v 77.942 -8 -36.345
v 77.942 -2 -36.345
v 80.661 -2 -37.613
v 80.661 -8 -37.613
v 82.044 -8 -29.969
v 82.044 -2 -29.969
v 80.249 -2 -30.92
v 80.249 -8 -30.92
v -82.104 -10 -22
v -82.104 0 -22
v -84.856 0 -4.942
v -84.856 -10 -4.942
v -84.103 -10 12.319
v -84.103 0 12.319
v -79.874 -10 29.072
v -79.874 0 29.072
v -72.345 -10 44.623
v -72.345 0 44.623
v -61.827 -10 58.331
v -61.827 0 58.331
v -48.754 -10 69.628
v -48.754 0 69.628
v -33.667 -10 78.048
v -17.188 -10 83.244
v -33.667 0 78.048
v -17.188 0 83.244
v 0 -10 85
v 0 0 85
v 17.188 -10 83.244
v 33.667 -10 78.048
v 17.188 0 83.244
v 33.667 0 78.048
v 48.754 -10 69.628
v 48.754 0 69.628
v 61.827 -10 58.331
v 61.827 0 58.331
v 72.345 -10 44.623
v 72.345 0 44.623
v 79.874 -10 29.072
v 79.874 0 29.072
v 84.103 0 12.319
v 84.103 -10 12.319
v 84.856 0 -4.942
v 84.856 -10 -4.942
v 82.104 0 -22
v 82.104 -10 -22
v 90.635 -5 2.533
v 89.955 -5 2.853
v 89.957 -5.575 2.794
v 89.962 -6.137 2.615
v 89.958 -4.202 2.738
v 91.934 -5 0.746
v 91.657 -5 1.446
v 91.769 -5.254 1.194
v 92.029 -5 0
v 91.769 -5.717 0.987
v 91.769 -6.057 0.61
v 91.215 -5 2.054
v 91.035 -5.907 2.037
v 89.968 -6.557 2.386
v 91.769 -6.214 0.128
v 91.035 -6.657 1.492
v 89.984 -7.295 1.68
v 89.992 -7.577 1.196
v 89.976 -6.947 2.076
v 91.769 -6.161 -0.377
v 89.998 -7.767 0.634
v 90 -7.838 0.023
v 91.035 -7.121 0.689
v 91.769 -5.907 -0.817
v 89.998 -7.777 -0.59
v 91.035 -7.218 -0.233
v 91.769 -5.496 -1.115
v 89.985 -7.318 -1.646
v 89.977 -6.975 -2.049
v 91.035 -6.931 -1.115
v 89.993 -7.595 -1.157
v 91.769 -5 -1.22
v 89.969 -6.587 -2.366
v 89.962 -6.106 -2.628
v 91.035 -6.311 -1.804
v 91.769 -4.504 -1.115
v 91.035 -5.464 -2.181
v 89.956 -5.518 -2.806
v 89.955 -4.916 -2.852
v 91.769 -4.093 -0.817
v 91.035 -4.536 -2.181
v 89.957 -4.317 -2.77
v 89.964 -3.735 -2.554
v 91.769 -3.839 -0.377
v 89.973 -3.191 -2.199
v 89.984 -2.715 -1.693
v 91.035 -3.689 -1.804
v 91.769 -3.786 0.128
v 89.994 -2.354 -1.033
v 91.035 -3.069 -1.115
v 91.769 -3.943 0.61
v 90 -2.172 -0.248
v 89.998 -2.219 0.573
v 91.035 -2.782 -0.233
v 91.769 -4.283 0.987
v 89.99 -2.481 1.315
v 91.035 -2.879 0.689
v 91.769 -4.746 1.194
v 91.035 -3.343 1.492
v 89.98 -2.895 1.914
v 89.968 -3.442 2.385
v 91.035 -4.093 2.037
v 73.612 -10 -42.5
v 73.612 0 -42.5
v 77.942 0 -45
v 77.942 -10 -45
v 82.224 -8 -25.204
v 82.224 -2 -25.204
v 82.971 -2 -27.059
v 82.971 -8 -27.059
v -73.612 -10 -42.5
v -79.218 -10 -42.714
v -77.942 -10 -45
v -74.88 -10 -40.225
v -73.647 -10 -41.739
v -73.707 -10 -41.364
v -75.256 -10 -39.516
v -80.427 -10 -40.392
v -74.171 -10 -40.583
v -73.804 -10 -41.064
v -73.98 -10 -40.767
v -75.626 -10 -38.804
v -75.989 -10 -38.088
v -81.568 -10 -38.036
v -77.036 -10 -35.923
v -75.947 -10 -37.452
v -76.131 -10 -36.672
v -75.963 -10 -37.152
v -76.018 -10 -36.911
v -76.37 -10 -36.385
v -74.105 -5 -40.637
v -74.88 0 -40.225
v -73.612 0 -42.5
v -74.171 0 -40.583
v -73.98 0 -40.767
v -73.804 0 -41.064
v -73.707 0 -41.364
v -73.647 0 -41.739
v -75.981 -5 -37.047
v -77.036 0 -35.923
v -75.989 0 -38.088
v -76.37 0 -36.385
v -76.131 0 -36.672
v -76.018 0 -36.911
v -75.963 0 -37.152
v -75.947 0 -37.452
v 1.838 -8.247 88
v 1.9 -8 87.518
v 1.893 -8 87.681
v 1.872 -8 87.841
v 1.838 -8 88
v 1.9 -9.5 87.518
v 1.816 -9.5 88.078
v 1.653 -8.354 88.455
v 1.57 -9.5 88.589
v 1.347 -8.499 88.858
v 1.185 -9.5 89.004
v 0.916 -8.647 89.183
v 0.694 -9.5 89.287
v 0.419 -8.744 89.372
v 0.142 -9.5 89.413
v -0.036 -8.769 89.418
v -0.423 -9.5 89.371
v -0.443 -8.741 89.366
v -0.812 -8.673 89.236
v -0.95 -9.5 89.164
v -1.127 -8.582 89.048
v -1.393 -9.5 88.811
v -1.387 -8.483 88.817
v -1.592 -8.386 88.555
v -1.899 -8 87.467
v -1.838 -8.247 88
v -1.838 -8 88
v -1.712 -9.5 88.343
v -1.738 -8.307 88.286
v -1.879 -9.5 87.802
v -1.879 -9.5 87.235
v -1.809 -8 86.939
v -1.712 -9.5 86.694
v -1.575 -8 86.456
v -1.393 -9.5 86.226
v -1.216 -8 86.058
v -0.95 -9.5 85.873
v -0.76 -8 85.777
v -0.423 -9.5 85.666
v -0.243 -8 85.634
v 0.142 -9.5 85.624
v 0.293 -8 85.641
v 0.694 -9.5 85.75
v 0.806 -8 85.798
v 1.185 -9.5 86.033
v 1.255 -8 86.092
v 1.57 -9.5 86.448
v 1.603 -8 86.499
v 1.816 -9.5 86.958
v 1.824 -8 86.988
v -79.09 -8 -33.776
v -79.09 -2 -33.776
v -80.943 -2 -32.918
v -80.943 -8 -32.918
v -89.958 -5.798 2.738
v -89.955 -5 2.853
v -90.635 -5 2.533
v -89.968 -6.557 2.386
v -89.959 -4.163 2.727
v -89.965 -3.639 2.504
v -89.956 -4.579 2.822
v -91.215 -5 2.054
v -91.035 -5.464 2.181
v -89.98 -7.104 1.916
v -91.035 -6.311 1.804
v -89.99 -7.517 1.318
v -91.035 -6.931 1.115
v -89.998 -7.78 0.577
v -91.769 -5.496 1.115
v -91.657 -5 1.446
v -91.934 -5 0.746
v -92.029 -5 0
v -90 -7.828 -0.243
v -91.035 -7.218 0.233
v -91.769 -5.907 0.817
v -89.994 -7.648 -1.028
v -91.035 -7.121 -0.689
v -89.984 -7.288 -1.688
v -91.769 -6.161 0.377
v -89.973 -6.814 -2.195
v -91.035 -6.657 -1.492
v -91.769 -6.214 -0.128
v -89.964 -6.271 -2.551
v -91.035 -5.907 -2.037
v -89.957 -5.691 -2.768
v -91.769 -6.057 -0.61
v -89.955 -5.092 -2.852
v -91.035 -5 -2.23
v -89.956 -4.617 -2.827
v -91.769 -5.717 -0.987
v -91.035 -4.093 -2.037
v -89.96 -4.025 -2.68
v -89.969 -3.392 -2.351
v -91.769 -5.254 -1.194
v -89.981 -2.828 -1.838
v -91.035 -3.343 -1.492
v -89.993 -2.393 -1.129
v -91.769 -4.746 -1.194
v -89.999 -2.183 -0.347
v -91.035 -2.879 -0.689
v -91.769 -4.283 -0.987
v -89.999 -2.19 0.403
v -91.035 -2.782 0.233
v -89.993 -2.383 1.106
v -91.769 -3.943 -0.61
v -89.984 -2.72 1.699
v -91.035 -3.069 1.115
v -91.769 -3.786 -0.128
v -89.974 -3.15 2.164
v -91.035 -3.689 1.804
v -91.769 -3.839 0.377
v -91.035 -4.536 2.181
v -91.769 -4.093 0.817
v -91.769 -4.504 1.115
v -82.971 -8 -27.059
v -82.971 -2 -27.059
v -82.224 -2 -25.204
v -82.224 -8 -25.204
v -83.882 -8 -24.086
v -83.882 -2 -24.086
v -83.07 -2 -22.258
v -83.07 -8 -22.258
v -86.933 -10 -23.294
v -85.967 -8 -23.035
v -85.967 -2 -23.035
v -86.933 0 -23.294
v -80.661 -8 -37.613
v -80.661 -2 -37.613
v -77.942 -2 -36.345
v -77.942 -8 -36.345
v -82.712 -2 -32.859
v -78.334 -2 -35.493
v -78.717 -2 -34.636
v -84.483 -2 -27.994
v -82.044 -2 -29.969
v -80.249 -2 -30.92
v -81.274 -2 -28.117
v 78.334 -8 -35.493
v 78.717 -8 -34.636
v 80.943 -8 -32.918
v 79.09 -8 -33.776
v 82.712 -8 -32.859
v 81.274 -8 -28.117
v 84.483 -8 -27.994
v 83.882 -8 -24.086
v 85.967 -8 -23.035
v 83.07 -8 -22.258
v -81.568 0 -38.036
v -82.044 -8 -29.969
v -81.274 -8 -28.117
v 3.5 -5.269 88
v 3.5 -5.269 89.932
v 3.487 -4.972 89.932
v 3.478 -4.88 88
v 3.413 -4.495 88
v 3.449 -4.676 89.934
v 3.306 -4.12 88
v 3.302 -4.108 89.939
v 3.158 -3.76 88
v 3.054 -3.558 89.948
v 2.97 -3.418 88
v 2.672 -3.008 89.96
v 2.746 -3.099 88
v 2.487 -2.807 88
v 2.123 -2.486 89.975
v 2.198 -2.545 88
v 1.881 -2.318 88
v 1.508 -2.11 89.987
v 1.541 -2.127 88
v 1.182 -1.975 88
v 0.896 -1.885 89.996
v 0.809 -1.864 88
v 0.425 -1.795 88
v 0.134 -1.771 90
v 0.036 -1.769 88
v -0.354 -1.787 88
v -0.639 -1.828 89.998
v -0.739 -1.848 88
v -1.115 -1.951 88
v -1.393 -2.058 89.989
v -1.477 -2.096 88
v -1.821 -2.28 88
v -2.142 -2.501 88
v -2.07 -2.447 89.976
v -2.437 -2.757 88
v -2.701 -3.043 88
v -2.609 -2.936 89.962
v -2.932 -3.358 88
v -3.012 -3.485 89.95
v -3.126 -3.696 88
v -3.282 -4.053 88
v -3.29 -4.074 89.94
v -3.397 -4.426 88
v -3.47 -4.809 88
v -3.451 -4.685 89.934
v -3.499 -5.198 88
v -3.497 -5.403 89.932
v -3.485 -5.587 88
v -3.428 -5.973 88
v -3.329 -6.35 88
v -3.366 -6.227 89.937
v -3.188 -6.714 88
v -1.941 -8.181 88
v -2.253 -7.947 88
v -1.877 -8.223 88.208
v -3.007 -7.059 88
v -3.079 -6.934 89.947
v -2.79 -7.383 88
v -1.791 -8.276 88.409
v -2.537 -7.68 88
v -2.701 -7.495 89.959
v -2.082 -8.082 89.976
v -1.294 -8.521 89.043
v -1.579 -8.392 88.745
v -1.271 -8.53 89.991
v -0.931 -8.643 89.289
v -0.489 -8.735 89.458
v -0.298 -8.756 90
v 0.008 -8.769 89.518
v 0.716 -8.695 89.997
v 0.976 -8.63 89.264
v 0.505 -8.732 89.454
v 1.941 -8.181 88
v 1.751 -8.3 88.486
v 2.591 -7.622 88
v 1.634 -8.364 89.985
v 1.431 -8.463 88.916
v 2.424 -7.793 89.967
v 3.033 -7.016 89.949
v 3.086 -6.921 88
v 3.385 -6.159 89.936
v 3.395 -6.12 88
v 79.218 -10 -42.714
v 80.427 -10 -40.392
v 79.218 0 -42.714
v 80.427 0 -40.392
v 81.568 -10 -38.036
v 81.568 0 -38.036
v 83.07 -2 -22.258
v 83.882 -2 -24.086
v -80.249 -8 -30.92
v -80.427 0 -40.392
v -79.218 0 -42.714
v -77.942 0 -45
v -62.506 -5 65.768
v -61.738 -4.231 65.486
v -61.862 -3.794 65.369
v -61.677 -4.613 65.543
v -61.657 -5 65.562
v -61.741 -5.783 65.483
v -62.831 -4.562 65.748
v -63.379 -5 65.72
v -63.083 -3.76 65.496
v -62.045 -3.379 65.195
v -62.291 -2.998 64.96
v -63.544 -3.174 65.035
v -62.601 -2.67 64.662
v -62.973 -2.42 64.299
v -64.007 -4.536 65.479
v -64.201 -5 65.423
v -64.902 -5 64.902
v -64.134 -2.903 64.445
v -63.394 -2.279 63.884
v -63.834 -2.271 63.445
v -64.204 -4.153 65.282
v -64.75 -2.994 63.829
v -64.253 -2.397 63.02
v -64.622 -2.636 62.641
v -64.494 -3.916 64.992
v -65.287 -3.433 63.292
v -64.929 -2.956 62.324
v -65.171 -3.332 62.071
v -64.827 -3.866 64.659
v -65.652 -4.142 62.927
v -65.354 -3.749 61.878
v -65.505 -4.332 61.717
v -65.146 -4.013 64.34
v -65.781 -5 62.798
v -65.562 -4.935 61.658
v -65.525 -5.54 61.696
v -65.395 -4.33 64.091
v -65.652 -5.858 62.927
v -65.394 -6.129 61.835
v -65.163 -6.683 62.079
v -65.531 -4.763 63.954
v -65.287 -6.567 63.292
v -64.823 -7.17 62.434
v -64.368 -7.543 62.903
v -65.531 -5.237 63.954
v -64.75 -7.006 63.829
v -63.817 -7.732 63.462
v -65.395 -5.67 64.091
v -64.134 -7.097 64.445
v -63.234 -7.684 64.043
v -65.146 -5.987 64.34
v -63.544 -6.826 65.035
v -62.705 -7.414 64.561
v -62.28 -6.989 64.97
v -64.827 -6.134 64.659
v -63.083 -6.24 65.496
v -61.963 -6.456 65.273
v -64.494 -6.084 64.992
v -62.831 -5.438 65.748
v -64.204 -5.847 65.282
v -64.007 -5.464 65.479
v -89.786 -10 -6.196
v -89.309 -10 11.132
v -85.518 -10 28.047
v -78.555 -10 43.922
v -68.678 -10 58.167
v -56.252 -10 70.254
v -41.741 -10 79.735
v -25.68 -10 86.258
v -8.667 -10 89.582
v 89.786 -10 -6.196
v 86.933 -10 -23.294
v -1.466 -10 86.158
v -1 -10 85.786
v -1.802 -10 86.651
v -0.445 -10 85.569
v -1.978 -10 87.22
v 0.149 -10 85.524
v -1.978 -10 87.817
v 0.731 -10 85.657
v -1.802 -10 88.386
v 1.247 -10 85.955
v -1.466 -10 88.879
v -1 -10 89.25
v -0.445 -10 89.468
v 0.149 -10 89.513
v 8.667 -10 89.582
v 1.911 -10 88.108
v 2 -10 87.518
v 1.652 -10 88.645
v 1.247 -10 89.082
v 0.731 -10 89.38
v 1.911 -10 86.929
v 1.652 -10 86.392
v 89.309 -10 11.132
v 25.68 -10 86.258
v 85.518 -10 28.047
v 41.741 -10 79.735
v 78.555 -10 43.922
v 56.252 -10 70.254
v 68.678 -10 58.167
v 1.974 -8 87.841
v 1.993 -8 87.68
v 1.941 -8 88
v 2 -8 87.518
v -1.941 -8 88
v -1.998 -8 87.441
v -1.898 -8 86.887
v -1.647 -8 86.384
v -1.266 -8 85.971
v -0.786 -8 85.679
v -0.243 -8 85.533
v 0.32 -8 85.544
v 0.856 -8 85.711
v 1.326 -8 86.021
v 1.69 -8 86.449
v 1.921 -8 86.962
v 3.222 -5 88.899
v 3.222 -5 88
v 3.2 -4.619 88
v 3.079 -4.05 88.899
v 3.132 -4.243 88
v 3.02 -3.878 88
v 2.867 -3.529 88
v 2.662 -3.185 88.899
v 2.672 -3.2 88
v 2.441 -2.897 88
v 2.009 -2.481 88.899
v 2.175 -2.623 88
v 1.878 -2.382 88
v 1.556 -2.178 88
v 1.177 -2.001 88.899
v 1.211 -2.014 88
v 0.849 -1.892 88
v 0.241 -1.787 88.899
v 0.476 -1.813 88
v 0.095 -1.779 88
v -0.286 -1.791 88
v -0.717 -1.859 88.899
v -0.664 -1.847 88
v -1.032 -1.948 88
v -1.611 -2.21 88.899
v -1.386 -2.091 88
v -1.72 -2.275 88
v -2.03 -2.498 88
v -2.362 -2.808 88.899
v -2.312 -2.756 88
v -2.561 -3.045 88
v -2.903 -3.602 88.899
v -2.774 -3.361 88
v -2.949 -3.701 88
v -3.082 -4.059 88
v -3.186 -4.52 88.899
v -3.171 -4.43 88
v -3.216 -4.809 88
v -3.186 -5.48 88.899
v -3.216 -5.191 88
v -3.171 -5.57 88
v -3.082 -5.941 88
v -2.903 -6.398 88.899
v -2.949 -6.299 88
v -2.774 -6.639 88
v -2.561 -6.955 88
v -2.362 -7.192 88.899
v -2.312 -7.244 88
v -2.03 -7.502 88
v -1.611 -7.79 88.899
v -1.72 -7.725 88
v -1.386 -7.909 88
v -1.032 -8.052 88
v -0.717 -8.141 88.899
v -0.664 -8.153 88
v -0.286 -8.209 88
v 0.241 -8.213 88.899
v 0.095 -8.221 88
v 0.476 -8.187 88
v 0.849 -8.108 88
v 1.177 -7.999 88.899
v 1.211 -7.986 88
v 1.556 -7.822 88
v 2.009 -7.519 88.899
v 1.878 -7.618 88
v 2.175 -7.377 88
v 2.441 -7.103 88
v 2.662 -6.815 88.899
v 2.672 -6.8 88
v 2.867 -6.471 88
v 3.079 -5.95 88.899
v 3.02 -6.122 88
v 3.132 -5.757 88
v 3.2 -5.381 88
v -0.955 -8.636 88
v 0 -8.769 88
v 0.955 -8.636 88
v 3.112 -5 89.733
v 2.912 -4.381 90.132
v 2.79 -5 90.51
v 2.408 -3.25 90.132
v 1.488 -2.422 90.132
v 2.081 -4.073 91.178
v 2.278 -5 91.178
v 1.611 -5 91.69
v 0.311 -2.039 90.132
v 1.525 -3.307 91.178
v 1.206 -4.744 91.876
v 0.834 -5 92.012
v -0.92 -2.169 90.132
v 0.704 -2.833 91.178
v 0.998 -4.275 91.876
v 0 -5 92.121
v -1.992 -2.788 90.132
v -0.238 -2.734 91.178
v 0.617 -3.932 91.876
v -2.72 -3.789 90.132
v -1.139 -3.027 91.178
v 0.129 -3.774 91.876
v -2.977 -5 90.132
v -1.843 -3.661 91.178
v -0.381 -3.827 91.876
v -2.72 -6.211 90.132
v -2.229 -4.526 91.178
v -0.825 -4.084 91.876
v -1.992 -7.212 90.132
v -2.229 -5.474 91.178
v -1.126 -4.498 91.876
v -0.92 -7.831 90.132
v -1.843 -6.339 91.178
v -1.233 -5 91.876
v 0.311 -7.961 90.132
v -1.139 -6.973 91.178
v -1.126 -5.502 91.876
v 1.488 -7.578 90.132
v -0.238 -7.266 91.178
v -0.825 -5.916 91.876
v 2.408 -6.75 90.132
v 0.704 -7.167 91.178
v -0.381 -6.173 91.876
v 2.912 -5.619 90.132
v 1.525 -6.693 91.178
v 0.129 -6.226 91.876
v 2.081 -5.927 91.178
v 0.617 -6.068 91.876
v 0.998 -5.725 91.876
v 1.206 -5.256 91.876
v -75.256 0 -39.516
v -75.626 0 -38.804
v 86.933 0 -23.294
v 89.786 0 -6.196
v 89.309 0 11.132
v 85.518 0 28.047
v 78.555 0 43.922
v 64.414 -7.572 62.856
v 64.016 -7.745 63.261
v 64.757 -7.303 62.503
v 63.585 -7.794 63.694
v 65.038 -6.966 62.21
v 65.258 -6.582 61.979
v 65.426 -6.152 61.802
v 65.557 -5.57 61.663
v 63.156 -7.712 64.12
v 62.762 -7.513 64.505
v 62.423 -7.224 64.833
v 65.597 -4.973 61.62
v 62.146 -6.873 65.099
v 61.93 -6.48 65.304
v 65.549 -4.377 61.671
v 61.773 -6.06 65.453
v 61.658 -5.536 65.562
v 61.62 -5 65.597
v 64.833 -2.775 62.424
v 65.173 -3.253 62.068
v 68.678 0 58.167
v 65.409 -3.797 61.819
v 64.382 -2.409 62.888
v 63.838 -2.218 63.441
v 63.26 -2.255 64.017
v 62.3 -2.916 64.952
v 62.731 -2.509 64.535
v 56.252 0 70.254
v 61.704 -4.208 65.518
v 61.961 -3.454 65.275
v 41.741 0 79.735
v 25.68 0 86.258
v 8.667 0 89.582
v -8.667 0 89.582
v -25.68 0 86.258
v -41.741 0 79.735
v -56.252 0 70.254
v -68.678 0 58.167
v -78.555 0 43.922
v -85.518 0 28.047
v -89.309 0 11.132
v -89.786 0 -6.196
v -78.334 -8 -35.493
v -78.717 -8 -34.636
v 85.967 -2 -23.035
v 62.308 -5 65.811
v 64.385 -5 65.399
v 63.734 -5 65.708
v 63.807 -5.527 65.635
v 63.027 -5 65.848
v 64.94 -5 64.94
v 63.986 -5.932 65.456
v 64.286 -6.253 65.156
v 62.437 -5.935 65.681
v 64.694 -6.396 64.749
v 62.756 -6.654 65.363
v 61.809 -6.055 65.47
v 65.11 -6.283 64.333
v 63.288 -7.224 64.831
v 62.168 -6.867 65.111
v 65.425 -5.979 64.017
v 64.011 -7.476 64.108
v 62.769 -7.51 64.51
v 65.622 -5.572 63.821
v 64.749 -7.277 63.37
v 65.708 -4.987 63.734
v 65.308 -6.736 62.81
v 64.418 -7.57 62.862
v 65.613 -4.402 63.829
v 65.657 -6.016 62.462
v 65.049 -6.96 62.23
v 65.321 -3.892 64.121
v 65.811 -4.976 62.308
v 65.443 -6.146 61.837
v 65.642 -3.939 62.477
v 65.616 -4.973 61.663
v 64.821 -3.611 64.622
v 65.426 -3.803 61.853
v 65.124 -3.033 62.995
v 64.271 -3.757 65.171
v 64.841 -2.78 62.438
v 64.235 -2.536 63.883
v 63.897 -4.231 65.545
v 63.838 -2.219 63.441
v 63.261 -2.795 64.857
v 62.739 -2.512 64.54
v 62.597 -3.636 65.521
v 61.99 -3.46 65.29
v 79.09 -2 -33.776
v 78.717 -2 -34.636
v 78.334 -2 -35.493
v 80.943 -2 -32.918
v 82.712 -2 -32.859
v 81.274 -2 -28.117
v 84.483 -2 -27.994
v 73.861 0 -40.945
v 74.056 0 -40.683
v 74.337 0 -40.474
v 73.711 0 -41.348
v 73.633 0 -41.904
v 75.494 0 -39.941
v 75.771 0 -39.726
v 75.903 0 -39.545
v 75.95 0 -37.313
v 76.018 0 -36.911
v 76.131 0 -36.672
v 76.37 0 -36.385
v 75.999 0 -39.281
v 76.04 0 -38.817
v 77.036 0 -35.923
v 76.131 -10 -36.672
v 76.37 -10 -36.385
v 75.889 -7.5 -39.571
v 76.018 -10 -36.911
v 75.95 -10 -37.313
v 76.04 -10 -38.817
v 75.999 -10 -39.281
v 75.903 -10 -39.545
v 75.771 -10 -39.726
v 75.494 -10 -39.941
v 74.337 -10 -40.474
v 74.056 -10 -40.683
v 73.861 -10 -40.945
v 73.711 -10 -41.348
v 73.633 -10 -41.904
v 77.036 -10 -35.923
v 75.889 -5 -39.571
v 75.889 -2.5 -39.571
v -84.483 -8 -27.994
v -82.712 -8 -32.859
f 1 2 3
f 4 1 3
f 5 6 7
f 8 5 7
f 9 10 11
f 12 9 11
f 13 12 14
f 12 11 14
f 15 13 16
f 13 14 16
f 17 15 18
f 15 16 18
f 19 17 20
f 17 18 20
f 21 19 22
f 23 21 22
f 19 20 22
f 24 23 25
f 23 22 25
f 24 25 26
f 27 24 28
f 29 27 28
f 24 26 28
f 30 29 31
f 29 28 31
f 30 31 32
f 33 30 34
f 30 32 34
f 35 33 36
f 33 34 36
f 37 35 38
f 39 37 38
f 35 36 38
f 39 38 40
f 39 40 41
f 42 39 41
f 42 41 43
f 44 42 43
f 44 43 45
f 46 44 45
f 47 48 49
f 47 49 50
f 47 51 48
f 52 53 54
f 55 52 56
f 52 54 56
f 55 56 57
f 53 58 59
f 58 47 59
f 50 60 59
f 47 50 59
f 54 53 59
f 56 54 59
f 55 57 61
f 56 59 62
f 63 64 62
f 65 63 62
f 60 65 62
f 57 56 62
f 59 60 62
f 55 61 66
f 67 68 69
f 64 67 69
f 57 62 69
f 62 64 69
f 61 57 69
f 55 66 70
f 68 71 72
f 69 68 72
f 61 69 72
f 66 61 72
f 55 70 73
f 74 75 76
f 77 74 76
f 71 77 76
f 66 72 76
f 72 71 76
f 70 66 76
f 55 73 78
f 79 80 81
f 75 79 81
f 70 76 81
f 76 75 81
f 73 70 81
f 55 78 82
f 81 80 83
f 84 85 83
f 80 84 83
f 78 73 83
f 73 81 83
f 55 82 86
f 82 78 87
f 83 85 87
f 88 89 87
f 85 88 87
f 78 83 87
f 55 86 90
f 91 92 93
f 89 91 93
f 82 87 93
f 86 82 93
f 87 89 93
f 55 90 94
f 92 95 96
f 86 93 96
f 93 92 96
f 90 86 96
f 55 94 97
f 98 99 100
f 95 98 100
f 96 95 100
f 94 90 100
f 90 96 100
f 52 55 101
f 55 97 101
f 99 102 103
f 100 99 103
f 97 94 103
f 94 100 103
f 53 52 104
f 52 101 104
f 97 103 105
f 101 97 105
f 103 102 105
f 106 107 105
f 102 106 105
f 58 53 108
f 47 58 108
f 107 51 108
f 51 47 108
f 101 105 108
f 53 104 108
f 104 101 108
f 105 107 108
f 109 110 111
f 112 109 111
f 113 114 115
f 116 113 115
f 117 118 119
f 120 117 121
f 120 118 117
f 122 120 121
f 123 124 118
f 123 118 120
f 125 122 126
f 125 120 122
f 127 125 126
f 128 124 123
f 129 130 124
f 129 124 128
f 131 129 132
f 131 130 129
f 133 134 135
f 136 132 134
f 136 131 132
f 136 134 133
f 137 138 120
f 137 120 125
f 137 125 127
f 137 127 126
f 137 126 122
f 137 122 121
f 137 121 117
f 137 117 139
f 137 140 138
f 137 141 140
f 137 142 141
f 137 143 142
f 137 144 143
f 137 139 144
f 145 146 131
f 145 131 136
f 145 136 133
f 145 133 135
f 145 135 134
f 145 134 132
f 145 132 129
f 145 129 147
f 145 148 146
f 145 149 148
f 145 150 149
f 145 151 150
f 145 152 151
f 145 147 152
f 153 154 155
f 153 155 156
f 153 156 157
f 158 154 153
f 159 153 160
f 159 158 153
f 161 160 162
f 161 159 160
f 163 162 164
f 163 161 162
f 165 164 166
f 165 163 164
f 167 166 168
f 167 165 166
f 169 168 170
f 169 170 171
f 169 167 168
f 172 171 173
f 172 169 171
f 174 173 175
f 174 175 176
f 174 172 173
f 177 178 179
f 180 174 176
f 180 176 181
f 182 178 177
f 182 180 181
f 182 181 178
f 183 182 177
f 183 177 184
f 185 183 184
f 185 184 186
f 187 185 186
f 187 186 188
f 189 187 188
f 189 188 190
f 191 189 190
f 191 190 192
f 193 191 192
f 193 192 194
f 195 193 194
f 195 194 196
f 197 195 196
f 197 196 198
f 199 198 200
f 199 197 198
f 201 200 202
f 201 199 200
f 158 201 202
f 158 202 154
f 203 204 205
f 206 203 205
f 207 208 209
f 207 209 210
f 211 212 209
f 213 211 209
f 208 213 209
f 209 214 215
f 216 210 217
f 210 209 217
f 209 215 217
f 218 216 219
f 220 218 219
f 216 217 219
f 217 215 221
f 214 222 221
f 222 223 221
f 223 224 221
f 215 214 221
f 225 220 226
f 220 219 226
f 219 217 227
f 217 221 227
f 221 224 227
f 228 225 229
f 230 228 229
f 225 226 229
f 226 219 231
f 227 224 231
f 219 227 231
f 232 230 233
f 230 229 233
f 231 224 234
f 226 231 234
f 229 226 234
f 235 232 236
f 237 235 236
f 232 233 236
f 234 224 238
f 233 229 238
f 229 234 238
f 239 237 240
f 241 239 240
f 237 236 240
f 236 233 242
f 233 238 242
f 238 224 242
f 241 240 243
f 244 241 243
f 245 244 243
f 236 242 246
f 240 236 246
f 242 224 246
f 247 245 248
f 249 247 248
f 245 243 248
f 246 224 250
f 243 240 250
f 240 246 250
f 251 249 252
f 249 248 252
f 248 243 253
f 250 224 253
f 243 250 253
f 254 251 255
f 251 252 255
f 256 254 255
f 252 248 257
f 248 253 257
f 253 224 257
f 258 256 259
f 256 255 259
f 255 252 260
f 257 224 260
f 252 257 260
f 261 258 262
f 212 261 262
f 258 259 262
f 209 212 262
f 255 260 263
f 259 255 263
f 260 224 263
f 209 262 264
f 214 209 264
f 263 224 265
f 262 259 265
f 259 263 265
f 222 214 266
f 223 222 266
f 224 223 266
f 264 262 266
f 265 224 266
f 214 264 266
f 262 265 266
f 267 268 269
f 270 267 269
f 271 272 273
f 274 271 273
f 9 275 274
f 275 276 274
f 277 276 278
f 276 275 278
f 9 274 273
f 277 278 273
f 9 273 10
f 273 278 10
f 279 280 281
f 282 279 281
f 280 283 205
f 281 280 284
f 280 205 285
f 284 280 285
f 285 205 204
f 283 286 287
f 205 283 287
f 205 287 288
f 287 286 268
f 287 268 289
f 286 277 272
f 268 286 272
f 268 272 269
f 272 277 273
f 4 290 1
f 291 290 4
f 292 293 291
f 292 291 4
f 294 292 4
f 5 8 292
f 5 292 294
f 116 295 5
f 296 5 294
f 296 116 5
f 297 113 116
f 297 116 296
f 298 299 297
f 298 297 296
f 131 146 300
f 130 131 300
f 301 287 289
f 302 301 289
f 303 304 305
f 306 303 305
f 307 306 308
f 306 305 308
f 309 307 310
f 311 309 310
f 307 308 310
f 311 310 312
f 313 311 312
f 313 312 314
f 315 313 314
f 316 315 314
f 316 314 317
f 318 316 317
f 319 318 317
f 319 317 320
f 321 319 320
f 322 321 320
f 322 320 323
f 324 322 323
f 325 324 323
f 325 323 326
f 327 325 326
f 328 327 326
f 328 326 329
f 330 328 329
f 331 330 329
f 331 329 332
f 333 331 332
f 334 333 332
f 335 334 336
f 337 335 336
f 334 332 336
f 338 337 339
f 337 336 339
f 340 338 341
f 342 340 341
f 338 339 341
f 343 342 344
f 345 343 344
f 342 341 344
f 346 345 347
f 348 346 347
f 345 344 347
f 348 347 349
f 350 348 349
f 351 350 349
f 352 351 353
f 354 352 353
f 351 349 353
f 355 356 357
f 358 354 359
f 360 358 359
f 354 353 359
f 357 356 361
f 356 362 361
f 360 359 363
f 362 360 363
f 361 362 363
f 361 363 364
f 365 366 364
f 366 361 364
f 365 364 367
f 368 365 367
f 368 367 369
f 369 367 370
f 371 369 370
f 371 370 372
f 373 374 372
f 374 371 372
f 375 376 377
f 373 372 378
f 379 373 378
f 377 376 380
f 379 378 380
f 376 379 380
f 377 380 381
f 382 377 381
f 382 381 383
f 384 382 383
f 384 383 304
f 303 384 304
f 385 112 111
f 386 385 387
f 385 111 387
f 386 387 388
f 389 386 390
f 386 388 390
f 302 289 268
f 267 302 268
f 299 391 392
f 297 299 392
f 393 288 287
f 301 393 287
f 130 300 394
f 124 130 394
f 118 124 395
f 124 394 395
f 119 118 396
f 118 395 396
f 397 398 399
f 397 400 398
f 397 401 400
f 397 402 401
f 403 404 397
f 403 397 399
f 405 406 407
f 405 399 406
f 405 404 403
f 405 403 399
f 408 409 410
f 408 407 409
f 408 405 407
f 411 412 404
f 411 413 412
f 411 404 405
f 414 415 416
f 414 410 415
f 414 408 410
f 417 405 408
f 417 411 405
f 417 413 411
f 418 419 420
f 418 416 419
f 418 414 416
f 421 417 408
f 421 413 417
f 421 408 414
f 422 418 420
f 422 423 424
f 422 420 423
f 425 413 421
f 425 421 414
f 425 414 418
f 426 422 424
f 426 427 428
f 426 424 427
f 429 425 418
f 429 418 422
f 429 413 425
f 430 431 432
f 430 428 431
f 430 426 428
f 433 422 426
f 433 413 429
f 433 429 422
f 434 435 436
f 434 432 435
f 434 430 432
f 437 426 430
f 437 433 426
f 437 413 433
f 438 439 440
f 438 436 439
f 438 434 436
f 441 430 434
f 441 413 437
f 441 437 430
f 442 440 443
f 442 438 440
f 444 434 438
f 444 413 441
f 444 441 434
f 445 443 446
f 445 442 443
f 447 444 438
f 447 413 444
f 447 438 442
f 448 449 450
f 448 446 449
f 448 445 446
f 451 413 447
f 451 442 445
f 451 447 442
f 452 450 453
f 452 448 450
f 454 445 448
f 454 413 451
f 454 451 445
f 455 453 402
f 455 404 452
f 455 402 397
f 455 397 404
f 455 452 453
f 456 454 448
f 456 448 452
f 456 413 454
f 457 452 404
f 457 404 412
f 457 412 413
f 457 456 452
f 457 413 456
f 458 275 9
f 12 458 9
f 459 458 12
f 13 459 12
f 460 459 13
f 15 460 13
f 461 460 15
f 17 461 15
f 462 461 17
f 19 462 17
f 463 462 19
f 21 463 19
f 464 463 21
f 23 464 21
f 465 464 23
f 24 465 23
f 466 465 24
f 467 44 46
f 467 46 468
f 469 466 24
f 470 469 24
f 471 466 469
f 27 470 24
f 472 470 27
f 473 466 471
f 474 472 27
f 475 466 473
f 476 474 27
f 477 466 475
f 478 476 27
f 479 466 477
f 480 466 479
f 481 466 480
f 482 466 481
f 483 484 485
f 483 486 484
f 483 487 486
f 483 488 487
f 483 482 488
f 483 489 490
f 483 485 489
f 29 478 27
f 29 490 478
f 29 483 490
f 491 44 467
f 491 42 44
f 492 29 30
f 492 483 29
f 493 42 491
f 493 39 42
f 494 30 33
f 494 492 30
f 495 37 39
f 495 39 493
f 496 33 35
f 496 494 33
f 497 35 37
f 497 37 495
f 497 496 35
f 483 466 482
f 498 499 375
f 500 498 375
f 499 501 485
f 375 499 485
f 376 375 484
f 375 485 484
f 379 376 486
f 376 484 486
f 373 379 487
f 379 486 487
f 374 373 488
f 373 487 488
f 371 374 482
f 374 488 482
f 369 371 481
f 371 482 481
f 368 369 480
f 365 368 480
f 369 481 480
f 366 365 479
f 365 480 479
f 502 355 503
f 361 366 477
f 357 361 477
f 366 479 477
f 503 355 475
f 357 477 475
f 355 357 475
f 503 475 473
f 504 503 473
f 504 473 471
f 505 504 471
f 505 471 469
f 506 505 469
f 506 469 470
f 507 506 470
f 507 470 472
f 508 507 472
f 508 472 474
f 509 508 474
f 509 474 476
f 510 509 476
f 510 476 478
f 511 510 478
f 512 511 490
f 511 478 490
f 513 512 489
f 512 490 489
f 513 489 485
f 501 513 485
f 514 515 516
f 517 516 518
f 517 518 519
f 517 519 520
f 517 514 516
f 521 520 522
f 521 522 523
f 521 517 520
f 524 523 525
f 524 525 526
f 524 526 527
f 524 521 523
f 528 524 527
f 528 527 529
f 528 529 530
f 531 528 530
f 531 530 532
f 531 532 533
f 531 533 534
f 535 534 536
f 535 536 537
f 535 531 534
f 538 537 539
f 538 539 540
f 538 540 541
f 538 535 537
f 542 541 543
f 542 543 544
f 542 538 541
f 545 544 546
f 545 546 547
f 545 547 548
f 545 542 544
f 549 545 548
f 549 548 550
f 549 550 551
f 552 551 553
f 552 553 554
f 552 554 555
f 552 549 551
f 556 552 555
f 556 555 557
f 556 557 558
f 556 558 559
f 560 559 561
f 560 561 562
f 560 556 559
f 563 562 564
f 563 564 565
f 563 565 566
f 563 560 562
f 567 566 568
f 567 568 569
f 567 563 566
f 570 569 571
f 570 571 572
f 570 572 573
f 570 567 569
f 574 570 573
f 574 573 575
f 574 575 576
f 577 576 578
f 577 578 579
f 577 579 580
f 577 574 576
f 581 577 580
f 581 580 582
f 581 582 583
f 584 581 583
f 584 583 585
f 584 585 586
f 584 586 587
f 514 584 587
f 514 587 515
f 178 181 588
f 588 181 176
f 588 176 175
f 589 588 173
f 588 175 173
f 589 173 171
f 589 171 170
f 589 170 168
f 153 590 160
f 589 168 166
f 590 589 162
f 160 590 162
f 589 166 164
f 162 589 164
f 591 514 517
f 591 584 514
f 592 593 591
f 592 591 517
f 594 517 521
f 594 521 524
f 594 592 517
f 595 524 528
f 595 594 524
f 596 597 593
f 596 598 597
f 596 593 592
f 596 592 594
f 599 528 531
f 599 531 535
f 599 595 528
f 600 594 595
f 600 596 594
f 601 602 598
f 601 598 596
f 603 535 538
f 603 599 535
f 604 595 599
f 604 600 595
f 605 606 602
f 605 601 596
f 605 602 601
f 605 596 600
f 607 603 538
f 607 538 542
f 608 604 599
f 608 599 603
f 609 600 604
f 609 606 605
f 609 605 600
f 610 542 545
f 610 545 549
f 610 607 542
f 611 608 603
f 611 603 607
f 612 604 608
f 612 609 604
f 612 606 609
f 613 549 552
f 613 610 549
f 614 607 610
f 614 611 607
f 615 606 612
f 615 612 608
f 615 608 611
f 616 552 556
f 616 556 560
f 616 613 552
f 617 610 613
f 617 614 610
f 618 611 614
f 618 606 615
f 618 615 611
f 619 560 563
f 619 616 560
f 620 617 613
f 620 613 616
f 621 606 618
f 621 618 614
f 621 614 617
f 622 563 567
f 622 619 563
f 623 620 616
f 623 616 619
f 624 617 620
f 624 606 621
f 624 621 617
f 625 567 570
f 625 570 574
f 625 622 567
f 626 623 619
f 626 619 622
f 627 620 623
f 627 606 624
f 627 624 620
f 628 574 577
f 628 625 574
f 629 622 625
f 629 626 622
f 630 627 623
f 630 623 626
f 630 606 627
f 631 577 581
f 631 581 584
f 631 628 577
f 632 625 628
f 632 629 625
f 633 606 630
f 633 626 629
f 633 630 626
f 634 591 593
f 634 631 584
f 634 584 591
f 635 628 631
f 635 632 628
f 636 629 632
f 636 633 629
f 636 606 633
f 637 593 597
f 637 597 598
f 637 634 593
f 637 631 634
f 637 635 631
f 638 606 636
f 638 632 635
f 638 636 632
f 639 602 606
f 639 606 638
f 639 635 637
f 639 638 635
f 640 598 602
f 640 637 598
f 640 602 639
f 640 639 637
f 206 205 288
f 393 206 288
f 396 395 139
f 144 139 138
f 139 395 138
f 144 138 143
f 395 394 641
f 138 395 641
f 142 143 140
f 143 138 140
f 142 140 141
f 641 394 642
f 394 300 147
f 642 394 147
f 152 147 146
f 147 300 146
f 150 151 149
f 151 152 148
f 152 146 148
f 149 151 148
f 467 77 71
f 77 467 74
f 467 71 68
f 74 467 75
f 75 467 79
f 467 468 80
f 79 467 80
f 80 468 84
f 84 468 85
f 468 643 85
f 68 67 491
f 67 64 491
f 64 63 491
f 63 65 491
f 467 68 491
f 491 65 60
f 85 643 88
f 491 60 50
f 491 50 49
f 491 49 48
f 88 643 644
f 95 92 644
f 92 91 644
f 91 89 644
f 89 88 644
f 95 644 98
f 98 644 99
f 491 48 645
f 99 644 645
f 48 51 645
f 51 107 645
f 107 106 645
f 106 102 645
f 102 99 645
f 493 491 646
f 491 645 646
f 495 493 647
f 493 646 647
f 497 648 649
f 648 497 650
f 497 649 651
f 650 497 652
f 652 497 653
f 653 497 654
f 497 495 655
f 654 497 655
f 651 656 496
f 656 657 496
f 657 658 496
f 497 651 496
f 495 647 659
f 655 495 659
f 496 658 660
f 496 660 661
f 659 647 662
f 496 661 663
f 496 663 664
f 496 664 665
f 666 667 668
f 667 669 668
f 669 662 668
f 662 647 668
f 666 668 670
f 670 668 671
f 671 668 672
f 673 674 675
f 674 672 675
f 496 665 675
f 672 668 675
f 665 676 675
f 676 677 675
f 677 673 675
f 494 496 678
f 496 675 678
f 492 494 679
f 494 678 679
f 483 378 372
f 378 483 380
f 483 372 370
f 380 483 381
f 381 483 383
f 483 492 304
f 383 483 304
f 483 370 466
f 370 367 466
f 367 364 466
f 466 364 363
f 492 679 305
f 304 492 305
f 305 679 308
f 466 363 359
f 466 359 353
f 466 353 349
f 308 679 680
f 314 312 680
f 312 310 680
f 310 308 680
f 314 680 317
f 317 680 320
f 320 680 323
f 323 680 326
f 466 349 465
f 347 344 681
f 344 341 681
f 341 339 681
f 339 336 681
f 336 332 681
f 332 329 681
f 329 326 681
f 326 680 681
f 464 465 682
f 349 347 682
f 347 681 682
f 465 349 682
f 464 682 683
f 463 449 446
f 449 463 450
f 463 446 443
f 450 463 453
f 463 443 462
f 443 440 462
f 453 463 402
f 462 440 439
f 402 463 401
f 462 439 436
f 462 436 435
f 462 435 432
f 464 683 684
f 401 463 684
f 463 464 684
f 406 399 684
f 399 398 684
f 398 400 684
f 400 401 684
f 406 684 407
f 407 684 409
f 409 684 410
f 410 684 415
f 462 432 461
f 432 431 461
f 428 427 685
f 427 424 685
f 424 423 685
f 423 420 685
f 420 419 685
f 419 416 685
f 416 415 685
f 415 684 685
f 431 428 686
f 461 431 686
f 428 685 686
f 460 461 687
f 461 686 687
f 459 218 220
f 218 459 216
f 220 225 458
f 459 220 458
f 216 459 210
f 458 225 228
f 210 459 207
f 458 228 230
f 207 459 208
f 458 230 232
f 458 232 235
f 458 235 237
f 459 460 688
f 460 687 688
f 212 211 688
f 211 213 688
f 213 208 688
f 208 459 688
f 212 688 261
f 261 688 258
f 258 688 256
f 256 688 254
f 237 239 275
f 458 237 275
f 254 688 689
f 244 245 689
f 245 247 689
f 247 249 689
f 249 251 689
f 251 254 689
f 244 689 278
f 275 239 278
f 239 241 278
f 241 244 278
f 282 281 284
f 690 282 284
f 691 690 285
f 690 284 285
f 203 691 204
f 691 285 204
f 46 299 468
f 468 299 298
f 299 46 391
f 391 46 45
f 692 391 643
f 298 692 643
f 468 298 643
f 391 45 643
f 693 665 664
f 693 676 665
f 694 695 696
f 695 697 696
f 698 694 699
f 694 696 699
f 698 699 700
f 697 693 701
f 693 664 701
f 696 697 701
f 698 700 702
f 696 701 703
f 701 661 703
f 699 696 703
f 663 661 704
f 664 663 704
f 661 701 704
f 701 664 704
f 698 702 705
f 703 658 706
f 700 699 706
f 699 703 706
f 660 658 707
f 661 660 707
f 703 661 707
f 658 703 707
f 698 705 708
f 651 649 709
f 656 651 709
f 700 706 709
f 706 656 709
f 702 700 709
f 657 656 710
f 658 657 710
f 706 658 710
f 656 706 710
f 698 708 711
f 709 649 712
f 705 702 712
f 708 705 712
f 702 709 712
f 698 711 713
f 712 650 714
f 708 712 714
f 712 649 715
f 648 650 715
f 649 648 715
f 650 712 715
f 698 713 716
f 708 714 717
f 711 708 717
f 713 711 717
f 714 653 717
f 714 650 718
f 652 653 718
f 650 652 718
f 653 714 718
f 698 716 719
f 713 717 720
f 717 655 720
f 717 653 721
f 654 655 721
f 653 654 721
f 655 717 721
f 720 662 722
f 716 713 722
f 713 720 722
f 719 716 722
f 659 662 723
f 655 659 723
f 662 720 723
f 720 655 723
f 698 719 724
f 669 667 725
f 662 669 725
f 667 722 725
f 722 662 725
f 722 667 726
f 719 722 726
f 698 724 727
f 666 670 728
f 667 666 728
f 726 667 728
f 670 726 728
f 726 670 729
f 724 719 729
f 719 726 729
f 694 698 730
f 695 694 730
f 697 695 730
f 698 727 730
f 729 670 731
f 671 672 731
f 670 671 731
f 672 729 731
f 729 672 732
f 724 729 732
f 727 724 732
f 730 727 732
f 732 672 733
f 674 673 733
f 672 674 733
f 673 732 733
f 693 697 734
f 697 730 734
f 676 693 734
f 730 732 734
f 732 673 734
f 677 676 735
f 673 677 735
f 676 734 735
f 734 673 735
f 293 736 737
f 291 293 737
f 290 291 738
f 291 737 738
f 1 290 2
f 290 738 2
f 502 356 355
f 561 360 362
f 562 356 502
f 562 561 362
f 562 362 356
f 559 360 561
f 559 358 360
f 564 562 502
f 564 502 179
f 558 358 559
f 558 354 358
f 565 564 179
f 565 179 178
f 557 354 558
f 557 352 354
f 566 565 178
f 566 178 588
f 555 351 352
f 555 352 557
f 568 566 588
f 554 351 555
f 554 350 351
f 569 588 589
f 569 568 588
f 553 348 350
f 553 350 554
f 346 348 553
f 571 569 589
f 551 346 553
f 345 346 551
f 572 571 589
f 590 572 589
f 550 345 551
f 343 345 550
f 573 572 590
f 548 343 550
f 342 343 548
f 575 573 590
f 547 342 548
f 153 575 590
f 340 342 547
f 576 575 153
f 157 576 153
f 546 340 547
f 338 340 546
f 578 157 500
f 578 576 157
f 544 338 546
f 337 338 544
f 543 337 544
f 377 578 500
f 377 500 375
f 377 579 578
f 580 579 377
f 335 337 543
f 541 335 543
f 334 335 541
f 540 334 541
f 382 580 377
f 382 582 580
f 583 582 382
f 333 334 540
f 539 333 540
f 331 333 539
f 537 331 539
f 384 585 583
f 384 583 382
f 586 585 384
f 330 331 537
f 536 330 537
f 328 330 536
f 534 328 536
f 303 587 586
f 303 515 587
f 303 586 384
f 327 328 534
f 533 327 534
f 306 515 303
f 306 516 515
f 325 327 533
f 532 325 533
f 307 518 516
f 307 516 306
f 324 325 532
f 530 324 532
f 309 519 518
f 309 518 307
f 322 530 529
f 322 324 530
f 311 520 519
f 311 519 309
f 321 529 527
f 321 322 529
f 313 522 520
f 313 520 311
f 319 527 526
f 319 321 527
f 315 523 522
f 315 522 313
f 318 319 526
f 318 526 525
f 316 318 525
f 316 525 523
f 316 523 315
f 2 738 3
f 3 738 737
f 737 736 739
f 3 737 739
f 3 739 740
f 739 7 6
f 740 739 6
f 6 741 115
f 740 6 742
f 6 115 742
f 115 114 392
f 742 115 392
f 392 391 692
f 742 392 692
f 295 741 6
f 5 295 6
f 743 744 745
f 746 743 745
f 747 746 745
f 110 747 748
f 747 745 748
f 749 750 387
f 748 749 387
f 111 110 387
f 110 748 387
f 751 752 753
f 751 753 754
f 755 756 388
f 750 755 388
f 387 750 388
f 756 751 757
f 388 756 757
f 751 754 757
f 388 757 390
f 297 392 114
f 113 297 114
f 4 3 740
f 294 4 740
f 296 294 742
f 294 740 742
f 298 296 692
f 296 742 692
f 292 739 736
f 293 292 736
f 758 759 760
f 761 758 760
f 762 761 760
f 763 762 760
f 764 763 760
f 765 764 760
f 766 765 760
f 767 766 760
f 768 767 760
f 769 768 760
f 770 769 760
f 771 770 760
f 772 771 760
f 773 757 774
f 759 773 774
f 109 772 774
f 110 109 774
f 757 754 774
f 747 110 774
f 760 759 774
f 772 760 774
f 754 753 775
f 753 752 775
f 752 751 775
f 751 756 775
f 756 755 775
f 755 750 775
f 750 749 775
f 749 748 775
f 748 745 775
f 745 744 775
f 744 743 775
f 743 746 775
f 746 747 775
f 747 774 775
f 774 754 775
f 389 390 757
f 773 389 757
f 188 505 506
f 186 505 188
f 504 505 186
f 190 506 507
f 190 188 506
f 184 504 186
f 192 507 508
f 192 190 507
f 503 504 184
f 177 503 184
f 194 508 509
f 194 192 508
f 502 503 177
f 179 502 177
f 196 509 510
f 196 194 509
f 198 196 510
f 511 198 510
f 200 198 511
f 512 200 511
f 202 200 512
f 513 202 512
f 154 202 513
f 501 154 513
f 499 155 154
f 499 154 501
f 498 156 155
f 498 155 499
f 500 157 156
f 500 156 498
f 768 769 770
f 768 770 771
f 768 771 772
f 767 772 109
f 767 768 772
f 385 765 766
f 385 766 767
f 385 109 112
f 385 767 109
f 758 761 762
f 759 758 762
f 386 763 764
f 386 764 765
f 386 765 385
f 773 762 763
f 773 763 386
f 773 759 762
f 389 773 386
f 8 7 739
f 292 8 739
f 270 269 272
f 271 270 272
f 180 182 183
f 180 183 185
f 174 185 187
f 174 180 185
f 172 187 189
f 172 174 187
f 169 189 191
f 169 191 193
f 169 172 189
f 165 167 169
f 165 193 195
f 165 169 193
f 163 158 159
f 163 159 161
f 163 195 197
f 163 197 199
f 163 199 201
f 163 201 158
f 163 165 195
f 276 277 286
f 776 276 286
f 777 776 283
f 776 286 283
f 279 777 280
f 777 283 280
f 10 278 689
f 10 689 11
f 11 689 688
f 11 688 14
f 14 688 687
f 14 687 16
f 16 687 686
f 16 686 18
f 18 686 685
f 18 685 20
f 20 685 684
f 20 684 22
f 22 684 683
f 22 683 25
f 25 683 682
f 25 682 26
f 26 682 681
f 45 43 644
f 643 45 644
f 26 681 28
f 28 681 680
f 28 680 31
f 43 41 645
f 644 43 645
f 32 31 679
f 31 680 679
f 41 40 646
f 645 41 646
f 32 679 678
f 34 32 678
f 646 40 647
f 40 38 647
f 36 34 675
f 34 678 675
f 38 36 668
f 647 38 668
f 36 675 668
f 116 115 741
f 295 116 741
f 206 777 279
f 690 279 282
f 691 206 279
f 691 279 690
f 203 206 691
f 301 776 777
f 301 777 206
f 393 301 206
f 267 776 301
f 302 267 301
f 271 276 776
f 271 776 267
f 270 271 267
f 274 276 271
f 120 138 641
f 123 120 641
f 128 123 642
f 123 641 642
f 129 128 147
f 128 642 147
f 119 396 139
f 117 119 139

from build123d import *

# Parameters (mm, degrees)
F1_DEPTH  = 10
F4_DEPTH  = 6
F6_DEPTH  = 10
F7_R      = 2
F7_R_2    = 1.9
F8_DEPTH  = 2
F10_R     = 3.5
F11_DEPTH = 2
F21_R     = 1.9
F22_DEPTH = 0.5


with BuildPart() as f1:
    # F0 (on Front) → F1 (new body)
    with BuildSketch(Plane.XZ):
        with BuildLine():
            ThreePointArc((-82.1036952346, -21.9996188337), (0, 85), (82.1036952346, -21.9996188337))
            Line((82.1036952346, -21.9996188337), (86.933324366, -23.2937140592))
            ThreePointArc((86.933324366, -23.2937140592), (0, 90), (-86.933324366, -23.2937140592))
            Line((-86.933324366, -23.2937140592), (-82.1036952346, -21.9996188337))
        make_face()
    extrude(amount=F1_DEPTH)

    # F3 (on offset) → F4 (join)
    with BuildSketch(Plane.XZ.offset(2)):
        with BuildLine():
            Line((85.9673985397, -23.0348950141), (83.0696210609, -22.2584378788))
            Line((83.0696210609, -22.2584378788), (83.8824317228, -24.0858236695))
            Line((83.8824317228, -24.0858236695), (82.2239511186, -25.2036081235))
            Line((82.2239511186, -25.2036081235), (82.9711464755, -27.0587898124))
            Line((82.9711464755, -27.0587898124), (81.2738982771, -28.1167825123))
            Line((81.2738982771, -28.1167825123), (82.0440426469, -29.9691148102))
            Line((82.0440426469, -29.9691148102), (80.2494925407, -30.9195560603))
            Line((80.2494925407, -30.9195560603), (80.9425488114, -32.9182744026))
            Line((80.9425488114, -32.9182744026), (79.0897431368, -33.7759164281))
            ThreePointArc((79.0897431368, -33.7759164281), (78.526614804, -35.0652358816), (77.9424696852, -36.3451705097))
            Line((77.9424696852, -36.3451705097), (80.6613930463, -37.6130252949))
            ThreePointArc((80.6613930463, -37.6130252949), (83.6326432499, -30.439792756), (85.9673985397, -23.0348950141))
        make_face()
        with BuildLine():
            Line((-82.2239511186, -25.2036081235), (-83.8824317228, -24.0858236695))
            Line((-83.8824317228, -24.0858236695), (-83.0696210609, -22.2584378788))
            Line((-83.0696210609, -22.2584378788), (-85.9673985397, -23.0348950141))
            ThreePointArc((-85.9673985397, -23.0348950141), (-83.6326432499, -30.439792756), (-80.6613930463, -37.6130252949))
            Line((-80.6613930463, -37.6130252949), (-77.9424696852, -36.3451705097))
            ThreePointArc((-77.9424696852, -36.3451705097), (-78.526614804, -35.0652358816), (-79.0897431368, -33.7759164281))
            Line((-79.0897431368, -33.7759164281), (-80.9425488114, -32.9182744026))
            Line((-80.9425488114, -32.9182744026), (-80.2494925407, -30.9195560603))
            Line((-80.2494925407, -30.9195560603), (-82.0440426469, -29.9691148102))
            Line((-82.0440426469, -29.9691148102), (-81.2738982771, -28.1167825123))
            Line((-81.2738982771, -28.1167825123), (-82.9711464755, -27.0587898124))
            Line((-82.9711464755, -27.0587898124), (-82.2239511186, -25.2036081235))
        make_face()
    extrude(amount=F4_DEPTH)

    # F7 (on face) → F8 (cut)
    with BuildSketch(Plane.XZ.offset(10)):
        with Locations((0, 87.5184461474)):
            Circle(F7_R)
        with Locations((0, 87.5184461474)):
            Circle(F7_R_2, mode=Mode.SUBTRACT)
    extrude(amount=-F8_DEPTH, mode=Mode.SUBTRACT)

    # F10 (on offset) → F11 (cut)
    with BuildSketch(Plane.XY.offset(90)):
        with Locations((0, -5.2689157891)):
            Circle(F10_R)
    extrude(amount=-F11_DEPTH, mode=Mode.SUBTRACT)

    # F13 (on offset) → F14 (revolve)
    with BuildSketch(Plane.XZ.offset(5)):
        with BuildLine():
            Line((0, 92.1213387046), (0, 88))
            Line((0, 88), (3.2221360598, 88))
            Line((3.2221360598, 88), (3.2221360598, 88.8992026448))
            ThreePointArc((3.2221360598, 88.8992026448), (2.2783942578, 91.1775969026), (0, 92.1213387046))
        make_face()
    revolve(axis=Axis((0, -5, 90.0606693523), (0, 0, 1)))

    # F15 (on offset) → F16 (revolve)
    with BuildSketch(Plane.XZ.offset(5)):
        with BuildLine():
            Line((86.490745002, 3), (86.490745002, 0))
            Line((86.490745002, 0), (92.0285186375, 0))
            ThreePointArc((92.0285186375, 0), (91.1498389811, 2.1213203436), (89.0285186375, 3))
            Line((89.0285186375, 3), (86.490745002, 3))
        make_face()
        with BuildLine():
            Line((-92.0285186375, 0), (-86.490745002, 0))
            Line((-86.490745002, 0), (-86.490745002, 3))
            Line((-86.490745002, 3), (-89.0285186375, 3))
            ThreePointArc((-89.0285186375, 3), (-91.1498389811, 2.1213203436), (-92.0285186375, 0))
        make_face()
    revolve(axis=Axis((89.2596318198, -5, 0), (1, 0, 0)))

    # F17 (on offset) → F18 (revolve)
    with BuildSketch(Plane.XZ.offset(5)):
        with BuildLine():
            Line((59.2343263561, 63.4769670432), (61.3556466997, 61.3556466997))
            Line((61.3556466997, 61.3556466997), (64.9397701984, 64.9397701984))
            ThreePointArc((64.9397701984, 64.9397701984), (62.8634241751, 65.8555322529), (60.7603356475, 65.0029763346))
            Line((60.7603356475, 65.0029763346), (59.2343263561, 63.4769670432))
        make_face()
    revolve(axis=Axis((63.147708449, -5, 63.147708449), (0.7071067812, 0, 0.7071067812)))

    # F19 (on offset) → F20 (revolve)
    with BuildSketch(Plane.XZ.offset(5)):
        with BuildLine():
            Line((-64.9019669508, 64.9019669508), (-61.5200344473, 61.5200344473))
            Line((-61.5200344473, 61.5200344473), (-59.3987141038, 63.6413547909))
            Line((-59.3987141038, 63.6413547909), (-60.6593262637, 64.9019669508))
            ThreePointArc((-60.6593262637, 64.9019669508), (-62.7806466073, 65.7806466073), (-64.9019669508, 64.9019669508))
        make_face()
    revolve(axis=Axis((-63.2110006991, -5, 63.2110006991), (-0.7071067812, 0, 0.7071067812)))

    # F21 (on face) → F22 (cut)
    with BuildSketch(Plane.XZ.offset(10)):
        with Locations((0, 87.5184461474)):
            Circle(F21_R)
    extrude(amount=-F22_DEPTH, mode=Mode.SUBTRACT)


with BuildPart() as f6:
    # F5 (on Front) → F6 (new body)
    with BuildSketch(Plane.XZ):
        with BuildLine():
            Line((-77.0361618981, -35.922552248), (-81.5677008333, -38.0356435567))
            ThreePointArc((-81.5677008333, -38.0356435567), (-79.830974986, -41.5573751912), (-77.9422863406, -45))
            Line((-77.9422863406, -45), (-73.6121593217, -42.5))
            ThreePointArc((-73.6121593217, -42.5), (-74.2545455659, -41.3674082195), (-74.8795071796, -40.2251091302))
            add(Edge.make_bspline(
                [(-75.9888335786, -38.0880187377), (-76.0421703816, -38.6398517158), (-76.1579769992, -39.7132043629), (-75.2851202488, -40.0602481492), (-74.8795071796, -40.2251091302)],
                knots=[0.3333908987, 0.3333908987, 0.3333908987, 0.3333908987, 0.5001251423, 0.6489809174, 0.6489809174, 0.6489809174, 0.6489809174], degree=3))
            ThreePointArc((-75.9888335786, -38.0880187377), (-76.5201582685, -37.0089905098), (-77.0361618981, -35.922552248))
        make_face()
        with BuildLine():
            add(Edge.make_bspline(
                [(-77.0361618981, -35.922552248), (-76.5679988081, -36.2025121173), (-75.8564354899, -36.6280244608), (-75.9523528632, -37.7105821334), (-75.9888335786, -38.0880187377)],
                knots=[0, 0, 0, 0, 0.2193498587, 0.3333908987, 0.3333908987, 0.3333908987, 0.3333908987], degree=3))
            ThreePointArc((-77.0361618981, -35.922552248), (-76.5201582685, -37.0089905098), (-75.9888335786, -38.0880187377))
        make_face()
        with BuildLine():
            ThreePointArc((-74.8795071796, -40.2251091302), (-74.2545455659, -41.3674082195), (-73.6121593217, -42.5))
            add(Edge.make_bspline(
                [(-74.8795071796, -40.2251091302), (-74.5913320738, -40.3422375816), (-73.6450547247, -40.7329577311), (-73.6256898345, -41.7731814842), (-73.6121593217, -42.5)],
                knots=[0.6489809174, 0.6489809174, 0.6489809174, 0.6489809174, 0.7547381822, 1, 1, 1, 1], degree=3))
        make_face()
        with BuildLine():
            ThreePointArc((-74.8795071796, -40.2251091302), (-75.4417381137, -39.1604922132), (-75.9888335786, -38.0880187377))
            add(Edge.make_bspline(
                [(-75.9888335786, -38.0880187377), (-76.0421703816, -38.6398517158), (-76.1579769992, -39.7132043629), (-75.2851202488, -40.0602481492), (-74.8795071796, -40.2251091302)],
                knots=[0.3333908987, 0.3333908987, 0.3333908987, 0.3333908987, 0.5001251423, 0.6489809174, 0.6489809174, 0.6489809174, 0.6489809174], degree=3))
        make_face()
    extrude(amount=F6_DEPTH)


with BuildPart() as f6b:
    # F5 (on Front) → F6, piece 2 (new body)
    with BuildSketch(Plane.XZ):
        with BuildLine():
            Line((81.5677008333, -38.0356435567), (77.0361618981, -35.922552248))
            add(Edge.make_bspline(
                [(77.0361618981, -35.922552248), (76.5679988081, -36.2025121173), (75.5005710313, -36.8408301463), (76.631920675, -40.0354401877), (73.6532667448, -40.2918326734), (73.6256898345, -41.7731814842), (73.6121593217, -42.5)],
                knots=[0, 0, 0, 0, 0.2193498587, 0.5001251423, 0.7547381822, 1, 1, 1, 1], degree=3))
            Line((73.6121593217, -42.5), (77.9422863406, -45))
            ThreePointArc((77.9422863406, -45), (79.830974986, -41.5573751912), (81.5677008333, -38.0356435567))
        make_face()
    extrude(amount=F6_DEPTH)


solid = Compound([f1.part, f6.part, f6b.part])
